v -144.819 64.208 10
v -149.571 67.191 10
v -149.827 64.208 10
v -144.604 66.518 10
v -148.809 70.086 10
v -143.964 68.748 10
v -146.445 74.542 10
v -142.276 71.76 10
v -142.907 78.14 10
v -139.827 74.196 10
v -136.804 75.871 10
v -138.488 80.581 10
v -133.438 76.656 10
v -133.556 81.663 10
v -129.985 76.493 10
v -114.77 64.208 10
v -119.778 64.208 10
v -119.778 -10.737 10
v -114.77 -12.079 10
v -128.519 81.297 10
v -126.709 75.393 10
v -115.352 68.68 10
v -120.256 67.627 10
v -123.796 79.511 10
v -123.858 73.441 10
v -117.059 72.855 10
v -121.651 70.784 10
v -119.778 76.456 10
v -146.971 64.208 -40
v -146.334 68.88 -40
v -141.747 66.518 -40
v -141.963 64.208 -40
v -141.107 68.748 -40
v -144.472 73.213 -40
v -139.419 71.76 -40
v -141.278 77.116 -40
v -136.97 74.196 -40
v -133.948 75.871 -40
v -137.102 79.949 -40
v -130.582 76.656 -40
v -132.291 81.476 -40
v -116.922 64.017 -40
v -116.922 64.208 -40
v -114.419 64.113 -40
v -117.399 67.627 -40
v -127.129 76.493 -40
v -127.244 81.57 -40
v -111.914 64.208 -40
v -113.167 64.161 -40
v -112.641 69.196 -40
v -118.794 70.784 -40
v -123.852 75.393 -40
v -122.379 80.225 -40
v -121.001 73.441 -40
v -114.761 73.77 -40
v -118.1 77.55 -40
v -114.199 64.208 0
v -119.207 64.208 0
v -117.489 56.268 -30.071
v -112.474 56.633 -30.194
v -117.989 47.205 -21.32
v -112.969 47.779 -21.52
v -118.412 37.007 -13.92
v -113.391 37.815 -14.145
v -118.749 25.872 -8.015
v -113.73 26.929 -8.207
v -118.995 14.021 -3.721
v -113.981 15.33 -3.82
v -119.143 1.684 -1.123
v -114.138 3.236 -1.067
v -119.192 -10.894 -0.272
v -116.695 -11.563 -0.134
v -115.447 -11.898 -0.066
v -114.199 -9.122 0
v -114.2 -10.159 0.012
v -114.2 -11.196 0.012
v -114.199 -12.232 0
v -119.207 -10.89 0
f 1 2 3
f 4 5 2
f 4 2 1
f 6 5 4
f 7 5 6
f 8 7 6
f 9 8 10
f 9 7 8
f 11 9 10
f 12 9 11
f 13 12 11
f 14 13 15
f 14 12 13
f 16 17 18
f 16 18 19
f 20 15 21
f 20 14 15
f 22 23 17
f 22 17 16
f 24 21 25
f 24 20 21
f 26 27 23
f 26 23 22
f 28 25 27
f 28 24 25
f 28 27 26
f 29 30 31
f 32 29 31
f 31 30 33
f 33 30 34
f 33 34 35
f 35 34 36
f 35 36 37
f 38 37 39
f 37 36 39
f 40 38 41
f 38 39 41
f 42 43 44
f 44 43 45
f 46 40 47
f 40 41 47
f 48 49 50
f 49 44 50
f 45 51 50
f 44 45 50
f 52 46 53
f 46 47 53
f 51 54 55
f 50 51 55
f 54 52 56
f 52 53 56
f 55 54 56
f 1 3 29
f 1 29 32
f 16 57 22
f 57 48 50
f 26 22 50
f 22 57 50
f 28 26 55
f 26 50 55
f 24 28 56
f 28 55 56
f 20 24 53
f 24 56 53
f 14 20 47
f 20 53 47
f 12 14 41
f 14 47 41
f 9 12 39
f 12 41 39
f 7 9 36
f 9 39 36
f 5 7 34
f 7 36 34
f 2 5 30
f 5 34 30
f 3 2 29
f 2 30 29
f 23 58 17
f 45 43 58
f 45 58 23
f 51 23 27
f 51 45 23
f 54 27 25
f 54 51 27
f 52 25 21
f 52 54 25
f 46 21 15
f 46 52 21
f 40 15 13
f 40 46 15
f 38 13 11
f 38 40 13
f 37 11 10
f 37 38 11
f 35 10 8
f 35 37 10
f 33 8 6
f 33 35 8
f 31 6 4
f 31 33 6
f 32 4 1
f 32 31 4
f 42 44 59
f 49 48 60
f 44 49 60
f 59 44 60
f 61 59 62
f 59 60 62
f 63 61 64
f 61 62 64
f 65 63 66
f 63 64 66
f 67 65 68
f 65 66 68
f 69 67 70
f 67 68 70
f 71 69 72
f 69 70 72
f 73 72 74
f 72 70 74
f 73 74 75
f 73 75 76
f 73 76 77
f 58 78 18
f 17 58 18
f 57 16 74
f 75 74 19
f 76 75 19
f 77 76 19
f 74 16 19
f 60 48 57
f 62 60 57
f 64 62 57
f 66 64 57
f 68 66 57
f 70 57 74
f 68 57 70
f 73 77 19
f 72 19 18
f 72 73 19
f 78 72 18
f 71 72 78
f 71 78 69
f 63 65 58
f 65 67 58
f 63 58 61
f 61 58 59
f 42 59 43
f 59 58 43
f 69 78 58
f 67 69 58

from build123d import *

# Parameters (mm, degrees)
SKETCH1_R               = 3.2639
BOSS_EXTRUDE1_DEPTH     = 10
SKETCH2_W               = 55.96454122
SKETCH2_H               = 39.556429901
BOSS_EXTRUDE2_DEPTH     = 50
CUT_EXTRUDE1_DEPTH      = 3.621876658
CUT_EXTRUDE1_DEPTH_BACK = 57.750909587
CUT_EXTRUDE3_DEPTH      = 104.020815944
BOSS_EXTRUDE3_REACH     = 105.021
SKETCH10_R              = 90
CUT_EXTRUDE4_DEPTH      = 50
CUT_EXTRUDE5_DEPTH      = 50


with BuildPart() as part:
    # Sketch1 → Boss-Extrude1 (new body)
    with BuildSketch(Plane.XY):
        with BuildLine():
            ThreePointArc((0, -23.8125), (-4.393398282, -34.419101718), (-15, -38.8125))
            Line((-15, -38.8125), (-119.778475404, -10.737192131))
            Line((-119.778475404, -10.737192131), (-119.778475404, 66.887807869))
            Line((-119.778475404, 66.887807869), (-15, 38.8125))
            ThreePointArc((-15, 38.8125), (-4.393398282, 34.419101718), (0, 23.8125))
            Line((0, 23.8125), (0, -23.8125))
        make_face()
        with Locations((-15, 23.8125)):
            Circle(SKETCH1_R, mode=Mode.SUBTRACT)
        with Locations((-15, -23.8125)):
            Circle(SKETCH1_R, mode=Mode.SUBTRACT)
    extrude(amount=BOSS_EXTRUDE1_DEPTH)

    # Sketch2 → Boss-Extrude2 (add)
    with BuildSketch(Plane.XY.offset(10)):
        with Locations((-137.760746014, 83.986530895)):
            Rectangle(SKETCH2_W, SKETCH2_H)
    extrude(amount=-BOSS_EXTRUDE2_DEPTH)

    # Sketch4 → Cut-Extrude1 (cut, two sides)
    with BuildSketch(Plane(origin=(-0.959208406, 0, 16.788657247), x_dir=(0, 1, 0), z_dir=(-0.057041289, 0, 0.99837182))) as cut_extrude1_sk:
        with BuildLine():
            ThreePointArc((64.208315944, 114.013041626), (81.708315944, 131.513041626), (64.208315944, 149.013041626))
            Line((64.208315944, 149.013041626), (64.208315944, 176.700065815))
            Line((64.208315944, 176.700065815), (111.984574651, 176.700065815))
            Line((111.984574651, 176.700065815), (111.984574651, 106.901315277))
            Line((111.984574651, 106.901315277), (64.208315944, 106.901315277))
            Line((64.208315944, 106.901315277), (64.208315944, 114.013041626))
        make_face()
        with BuildLine():
            Line((64.208315944, 144.013041626), (64.208315944, 119.013041626))
            ThreePointArc((64.208315944, 119.013041626), (76.708315944, 131.513041626), (64.208315944, 144.013041626))
        make_face()
    extrude(amount=CUT_EXTRUDE1_DEPTH, mode=Mode.SUBTRACT)
    extrude(cut_extrude1_sk.sketch, amount=-CUT_EXTRUDE1_DEPTH_BACK, mode=Mode.SUBTRACT)

    # Sketch7 → Cut-Extrude3 (cut, through all)
    with BuildSketch(Plane(origin=(0, 64.208315944, 0), x_dir=(1, 0, 0), z_dir=(0, 1, 0))):
        Polygon((-119.778475404, 0), (-119.207132269, 0), (-119.778475404, -10), align=None)
    extrude(amount=-CUT_EXTRUDE3_DEPTH, mode=Mode.SUBTRACT)

    # Boss-Extrude3: up to this face of the body (flat: up to its plane)
    boss_extrude3_end = Plane(part.part.faces().sort_by_distance((-67.246532084, -24.813083921, 5.004556479))[0])
    # Sketch8 → Boss-Extrude3 (add, up to the picked face)
    with BuildSketch(Plane.XZ.offset(-64.208315944), mode=Mode.PRIVATE) as boss_extrude3_sk1:
        Polygon((-119.207132269, 0), (-116.92175973, -40), (-111.913605554, -40), (-114.198978093, 0), align=None)
    boss_extrude3_tool1 = split(extrude(boss_extrude3_sk1.sketch, amount=BOSS_EXTRUDE3_REACH, mode=Mode.PRIVATE), bisect_by=boss_extrude3_end, keep=Keep.BOTH, mode=Mode.PRIVATE)
    add(boss_extrude3_tool1.solids().sort_by_distance((-115.560369, 64.208316, -20))[0])

    # Sketch10 → Cut-Extrude4 (cut)
    with BuildSketch(Plane(origin=(-113.827407897, 0, -6.503450805), x_dir=(0.057041289, 0, -0.99837182), z_dir=(0.99837182, 0, 0.057041289))):
        with Locations((83.472510719, -10.677332841)):
            Circle(SKETCH10_R)
    extrude(amount=-CUT_EXTRUDE4_DEPTH, mode=Mode.SUBTRACT)

    # Sketch13 → Cut-Extrude5 (cut)
    with BuildSketch(Plane(origin=(-0.959208406, 0, 16.788657247), x_dir=(0, 1, 0), z_dir=(-0.057041289, 0, 0.99837182))):
        Polygon((64.208315944, 114.013041626), (-14.406743592, 114.013041626), (-68.138706229, -11.161425168), (108.567056958, -47.624519159), align=None)
    extrude(amount=-CUT_EXTRUDE5_DEPTH, mode=Mode.SUBTRACT)


solid = part.part
